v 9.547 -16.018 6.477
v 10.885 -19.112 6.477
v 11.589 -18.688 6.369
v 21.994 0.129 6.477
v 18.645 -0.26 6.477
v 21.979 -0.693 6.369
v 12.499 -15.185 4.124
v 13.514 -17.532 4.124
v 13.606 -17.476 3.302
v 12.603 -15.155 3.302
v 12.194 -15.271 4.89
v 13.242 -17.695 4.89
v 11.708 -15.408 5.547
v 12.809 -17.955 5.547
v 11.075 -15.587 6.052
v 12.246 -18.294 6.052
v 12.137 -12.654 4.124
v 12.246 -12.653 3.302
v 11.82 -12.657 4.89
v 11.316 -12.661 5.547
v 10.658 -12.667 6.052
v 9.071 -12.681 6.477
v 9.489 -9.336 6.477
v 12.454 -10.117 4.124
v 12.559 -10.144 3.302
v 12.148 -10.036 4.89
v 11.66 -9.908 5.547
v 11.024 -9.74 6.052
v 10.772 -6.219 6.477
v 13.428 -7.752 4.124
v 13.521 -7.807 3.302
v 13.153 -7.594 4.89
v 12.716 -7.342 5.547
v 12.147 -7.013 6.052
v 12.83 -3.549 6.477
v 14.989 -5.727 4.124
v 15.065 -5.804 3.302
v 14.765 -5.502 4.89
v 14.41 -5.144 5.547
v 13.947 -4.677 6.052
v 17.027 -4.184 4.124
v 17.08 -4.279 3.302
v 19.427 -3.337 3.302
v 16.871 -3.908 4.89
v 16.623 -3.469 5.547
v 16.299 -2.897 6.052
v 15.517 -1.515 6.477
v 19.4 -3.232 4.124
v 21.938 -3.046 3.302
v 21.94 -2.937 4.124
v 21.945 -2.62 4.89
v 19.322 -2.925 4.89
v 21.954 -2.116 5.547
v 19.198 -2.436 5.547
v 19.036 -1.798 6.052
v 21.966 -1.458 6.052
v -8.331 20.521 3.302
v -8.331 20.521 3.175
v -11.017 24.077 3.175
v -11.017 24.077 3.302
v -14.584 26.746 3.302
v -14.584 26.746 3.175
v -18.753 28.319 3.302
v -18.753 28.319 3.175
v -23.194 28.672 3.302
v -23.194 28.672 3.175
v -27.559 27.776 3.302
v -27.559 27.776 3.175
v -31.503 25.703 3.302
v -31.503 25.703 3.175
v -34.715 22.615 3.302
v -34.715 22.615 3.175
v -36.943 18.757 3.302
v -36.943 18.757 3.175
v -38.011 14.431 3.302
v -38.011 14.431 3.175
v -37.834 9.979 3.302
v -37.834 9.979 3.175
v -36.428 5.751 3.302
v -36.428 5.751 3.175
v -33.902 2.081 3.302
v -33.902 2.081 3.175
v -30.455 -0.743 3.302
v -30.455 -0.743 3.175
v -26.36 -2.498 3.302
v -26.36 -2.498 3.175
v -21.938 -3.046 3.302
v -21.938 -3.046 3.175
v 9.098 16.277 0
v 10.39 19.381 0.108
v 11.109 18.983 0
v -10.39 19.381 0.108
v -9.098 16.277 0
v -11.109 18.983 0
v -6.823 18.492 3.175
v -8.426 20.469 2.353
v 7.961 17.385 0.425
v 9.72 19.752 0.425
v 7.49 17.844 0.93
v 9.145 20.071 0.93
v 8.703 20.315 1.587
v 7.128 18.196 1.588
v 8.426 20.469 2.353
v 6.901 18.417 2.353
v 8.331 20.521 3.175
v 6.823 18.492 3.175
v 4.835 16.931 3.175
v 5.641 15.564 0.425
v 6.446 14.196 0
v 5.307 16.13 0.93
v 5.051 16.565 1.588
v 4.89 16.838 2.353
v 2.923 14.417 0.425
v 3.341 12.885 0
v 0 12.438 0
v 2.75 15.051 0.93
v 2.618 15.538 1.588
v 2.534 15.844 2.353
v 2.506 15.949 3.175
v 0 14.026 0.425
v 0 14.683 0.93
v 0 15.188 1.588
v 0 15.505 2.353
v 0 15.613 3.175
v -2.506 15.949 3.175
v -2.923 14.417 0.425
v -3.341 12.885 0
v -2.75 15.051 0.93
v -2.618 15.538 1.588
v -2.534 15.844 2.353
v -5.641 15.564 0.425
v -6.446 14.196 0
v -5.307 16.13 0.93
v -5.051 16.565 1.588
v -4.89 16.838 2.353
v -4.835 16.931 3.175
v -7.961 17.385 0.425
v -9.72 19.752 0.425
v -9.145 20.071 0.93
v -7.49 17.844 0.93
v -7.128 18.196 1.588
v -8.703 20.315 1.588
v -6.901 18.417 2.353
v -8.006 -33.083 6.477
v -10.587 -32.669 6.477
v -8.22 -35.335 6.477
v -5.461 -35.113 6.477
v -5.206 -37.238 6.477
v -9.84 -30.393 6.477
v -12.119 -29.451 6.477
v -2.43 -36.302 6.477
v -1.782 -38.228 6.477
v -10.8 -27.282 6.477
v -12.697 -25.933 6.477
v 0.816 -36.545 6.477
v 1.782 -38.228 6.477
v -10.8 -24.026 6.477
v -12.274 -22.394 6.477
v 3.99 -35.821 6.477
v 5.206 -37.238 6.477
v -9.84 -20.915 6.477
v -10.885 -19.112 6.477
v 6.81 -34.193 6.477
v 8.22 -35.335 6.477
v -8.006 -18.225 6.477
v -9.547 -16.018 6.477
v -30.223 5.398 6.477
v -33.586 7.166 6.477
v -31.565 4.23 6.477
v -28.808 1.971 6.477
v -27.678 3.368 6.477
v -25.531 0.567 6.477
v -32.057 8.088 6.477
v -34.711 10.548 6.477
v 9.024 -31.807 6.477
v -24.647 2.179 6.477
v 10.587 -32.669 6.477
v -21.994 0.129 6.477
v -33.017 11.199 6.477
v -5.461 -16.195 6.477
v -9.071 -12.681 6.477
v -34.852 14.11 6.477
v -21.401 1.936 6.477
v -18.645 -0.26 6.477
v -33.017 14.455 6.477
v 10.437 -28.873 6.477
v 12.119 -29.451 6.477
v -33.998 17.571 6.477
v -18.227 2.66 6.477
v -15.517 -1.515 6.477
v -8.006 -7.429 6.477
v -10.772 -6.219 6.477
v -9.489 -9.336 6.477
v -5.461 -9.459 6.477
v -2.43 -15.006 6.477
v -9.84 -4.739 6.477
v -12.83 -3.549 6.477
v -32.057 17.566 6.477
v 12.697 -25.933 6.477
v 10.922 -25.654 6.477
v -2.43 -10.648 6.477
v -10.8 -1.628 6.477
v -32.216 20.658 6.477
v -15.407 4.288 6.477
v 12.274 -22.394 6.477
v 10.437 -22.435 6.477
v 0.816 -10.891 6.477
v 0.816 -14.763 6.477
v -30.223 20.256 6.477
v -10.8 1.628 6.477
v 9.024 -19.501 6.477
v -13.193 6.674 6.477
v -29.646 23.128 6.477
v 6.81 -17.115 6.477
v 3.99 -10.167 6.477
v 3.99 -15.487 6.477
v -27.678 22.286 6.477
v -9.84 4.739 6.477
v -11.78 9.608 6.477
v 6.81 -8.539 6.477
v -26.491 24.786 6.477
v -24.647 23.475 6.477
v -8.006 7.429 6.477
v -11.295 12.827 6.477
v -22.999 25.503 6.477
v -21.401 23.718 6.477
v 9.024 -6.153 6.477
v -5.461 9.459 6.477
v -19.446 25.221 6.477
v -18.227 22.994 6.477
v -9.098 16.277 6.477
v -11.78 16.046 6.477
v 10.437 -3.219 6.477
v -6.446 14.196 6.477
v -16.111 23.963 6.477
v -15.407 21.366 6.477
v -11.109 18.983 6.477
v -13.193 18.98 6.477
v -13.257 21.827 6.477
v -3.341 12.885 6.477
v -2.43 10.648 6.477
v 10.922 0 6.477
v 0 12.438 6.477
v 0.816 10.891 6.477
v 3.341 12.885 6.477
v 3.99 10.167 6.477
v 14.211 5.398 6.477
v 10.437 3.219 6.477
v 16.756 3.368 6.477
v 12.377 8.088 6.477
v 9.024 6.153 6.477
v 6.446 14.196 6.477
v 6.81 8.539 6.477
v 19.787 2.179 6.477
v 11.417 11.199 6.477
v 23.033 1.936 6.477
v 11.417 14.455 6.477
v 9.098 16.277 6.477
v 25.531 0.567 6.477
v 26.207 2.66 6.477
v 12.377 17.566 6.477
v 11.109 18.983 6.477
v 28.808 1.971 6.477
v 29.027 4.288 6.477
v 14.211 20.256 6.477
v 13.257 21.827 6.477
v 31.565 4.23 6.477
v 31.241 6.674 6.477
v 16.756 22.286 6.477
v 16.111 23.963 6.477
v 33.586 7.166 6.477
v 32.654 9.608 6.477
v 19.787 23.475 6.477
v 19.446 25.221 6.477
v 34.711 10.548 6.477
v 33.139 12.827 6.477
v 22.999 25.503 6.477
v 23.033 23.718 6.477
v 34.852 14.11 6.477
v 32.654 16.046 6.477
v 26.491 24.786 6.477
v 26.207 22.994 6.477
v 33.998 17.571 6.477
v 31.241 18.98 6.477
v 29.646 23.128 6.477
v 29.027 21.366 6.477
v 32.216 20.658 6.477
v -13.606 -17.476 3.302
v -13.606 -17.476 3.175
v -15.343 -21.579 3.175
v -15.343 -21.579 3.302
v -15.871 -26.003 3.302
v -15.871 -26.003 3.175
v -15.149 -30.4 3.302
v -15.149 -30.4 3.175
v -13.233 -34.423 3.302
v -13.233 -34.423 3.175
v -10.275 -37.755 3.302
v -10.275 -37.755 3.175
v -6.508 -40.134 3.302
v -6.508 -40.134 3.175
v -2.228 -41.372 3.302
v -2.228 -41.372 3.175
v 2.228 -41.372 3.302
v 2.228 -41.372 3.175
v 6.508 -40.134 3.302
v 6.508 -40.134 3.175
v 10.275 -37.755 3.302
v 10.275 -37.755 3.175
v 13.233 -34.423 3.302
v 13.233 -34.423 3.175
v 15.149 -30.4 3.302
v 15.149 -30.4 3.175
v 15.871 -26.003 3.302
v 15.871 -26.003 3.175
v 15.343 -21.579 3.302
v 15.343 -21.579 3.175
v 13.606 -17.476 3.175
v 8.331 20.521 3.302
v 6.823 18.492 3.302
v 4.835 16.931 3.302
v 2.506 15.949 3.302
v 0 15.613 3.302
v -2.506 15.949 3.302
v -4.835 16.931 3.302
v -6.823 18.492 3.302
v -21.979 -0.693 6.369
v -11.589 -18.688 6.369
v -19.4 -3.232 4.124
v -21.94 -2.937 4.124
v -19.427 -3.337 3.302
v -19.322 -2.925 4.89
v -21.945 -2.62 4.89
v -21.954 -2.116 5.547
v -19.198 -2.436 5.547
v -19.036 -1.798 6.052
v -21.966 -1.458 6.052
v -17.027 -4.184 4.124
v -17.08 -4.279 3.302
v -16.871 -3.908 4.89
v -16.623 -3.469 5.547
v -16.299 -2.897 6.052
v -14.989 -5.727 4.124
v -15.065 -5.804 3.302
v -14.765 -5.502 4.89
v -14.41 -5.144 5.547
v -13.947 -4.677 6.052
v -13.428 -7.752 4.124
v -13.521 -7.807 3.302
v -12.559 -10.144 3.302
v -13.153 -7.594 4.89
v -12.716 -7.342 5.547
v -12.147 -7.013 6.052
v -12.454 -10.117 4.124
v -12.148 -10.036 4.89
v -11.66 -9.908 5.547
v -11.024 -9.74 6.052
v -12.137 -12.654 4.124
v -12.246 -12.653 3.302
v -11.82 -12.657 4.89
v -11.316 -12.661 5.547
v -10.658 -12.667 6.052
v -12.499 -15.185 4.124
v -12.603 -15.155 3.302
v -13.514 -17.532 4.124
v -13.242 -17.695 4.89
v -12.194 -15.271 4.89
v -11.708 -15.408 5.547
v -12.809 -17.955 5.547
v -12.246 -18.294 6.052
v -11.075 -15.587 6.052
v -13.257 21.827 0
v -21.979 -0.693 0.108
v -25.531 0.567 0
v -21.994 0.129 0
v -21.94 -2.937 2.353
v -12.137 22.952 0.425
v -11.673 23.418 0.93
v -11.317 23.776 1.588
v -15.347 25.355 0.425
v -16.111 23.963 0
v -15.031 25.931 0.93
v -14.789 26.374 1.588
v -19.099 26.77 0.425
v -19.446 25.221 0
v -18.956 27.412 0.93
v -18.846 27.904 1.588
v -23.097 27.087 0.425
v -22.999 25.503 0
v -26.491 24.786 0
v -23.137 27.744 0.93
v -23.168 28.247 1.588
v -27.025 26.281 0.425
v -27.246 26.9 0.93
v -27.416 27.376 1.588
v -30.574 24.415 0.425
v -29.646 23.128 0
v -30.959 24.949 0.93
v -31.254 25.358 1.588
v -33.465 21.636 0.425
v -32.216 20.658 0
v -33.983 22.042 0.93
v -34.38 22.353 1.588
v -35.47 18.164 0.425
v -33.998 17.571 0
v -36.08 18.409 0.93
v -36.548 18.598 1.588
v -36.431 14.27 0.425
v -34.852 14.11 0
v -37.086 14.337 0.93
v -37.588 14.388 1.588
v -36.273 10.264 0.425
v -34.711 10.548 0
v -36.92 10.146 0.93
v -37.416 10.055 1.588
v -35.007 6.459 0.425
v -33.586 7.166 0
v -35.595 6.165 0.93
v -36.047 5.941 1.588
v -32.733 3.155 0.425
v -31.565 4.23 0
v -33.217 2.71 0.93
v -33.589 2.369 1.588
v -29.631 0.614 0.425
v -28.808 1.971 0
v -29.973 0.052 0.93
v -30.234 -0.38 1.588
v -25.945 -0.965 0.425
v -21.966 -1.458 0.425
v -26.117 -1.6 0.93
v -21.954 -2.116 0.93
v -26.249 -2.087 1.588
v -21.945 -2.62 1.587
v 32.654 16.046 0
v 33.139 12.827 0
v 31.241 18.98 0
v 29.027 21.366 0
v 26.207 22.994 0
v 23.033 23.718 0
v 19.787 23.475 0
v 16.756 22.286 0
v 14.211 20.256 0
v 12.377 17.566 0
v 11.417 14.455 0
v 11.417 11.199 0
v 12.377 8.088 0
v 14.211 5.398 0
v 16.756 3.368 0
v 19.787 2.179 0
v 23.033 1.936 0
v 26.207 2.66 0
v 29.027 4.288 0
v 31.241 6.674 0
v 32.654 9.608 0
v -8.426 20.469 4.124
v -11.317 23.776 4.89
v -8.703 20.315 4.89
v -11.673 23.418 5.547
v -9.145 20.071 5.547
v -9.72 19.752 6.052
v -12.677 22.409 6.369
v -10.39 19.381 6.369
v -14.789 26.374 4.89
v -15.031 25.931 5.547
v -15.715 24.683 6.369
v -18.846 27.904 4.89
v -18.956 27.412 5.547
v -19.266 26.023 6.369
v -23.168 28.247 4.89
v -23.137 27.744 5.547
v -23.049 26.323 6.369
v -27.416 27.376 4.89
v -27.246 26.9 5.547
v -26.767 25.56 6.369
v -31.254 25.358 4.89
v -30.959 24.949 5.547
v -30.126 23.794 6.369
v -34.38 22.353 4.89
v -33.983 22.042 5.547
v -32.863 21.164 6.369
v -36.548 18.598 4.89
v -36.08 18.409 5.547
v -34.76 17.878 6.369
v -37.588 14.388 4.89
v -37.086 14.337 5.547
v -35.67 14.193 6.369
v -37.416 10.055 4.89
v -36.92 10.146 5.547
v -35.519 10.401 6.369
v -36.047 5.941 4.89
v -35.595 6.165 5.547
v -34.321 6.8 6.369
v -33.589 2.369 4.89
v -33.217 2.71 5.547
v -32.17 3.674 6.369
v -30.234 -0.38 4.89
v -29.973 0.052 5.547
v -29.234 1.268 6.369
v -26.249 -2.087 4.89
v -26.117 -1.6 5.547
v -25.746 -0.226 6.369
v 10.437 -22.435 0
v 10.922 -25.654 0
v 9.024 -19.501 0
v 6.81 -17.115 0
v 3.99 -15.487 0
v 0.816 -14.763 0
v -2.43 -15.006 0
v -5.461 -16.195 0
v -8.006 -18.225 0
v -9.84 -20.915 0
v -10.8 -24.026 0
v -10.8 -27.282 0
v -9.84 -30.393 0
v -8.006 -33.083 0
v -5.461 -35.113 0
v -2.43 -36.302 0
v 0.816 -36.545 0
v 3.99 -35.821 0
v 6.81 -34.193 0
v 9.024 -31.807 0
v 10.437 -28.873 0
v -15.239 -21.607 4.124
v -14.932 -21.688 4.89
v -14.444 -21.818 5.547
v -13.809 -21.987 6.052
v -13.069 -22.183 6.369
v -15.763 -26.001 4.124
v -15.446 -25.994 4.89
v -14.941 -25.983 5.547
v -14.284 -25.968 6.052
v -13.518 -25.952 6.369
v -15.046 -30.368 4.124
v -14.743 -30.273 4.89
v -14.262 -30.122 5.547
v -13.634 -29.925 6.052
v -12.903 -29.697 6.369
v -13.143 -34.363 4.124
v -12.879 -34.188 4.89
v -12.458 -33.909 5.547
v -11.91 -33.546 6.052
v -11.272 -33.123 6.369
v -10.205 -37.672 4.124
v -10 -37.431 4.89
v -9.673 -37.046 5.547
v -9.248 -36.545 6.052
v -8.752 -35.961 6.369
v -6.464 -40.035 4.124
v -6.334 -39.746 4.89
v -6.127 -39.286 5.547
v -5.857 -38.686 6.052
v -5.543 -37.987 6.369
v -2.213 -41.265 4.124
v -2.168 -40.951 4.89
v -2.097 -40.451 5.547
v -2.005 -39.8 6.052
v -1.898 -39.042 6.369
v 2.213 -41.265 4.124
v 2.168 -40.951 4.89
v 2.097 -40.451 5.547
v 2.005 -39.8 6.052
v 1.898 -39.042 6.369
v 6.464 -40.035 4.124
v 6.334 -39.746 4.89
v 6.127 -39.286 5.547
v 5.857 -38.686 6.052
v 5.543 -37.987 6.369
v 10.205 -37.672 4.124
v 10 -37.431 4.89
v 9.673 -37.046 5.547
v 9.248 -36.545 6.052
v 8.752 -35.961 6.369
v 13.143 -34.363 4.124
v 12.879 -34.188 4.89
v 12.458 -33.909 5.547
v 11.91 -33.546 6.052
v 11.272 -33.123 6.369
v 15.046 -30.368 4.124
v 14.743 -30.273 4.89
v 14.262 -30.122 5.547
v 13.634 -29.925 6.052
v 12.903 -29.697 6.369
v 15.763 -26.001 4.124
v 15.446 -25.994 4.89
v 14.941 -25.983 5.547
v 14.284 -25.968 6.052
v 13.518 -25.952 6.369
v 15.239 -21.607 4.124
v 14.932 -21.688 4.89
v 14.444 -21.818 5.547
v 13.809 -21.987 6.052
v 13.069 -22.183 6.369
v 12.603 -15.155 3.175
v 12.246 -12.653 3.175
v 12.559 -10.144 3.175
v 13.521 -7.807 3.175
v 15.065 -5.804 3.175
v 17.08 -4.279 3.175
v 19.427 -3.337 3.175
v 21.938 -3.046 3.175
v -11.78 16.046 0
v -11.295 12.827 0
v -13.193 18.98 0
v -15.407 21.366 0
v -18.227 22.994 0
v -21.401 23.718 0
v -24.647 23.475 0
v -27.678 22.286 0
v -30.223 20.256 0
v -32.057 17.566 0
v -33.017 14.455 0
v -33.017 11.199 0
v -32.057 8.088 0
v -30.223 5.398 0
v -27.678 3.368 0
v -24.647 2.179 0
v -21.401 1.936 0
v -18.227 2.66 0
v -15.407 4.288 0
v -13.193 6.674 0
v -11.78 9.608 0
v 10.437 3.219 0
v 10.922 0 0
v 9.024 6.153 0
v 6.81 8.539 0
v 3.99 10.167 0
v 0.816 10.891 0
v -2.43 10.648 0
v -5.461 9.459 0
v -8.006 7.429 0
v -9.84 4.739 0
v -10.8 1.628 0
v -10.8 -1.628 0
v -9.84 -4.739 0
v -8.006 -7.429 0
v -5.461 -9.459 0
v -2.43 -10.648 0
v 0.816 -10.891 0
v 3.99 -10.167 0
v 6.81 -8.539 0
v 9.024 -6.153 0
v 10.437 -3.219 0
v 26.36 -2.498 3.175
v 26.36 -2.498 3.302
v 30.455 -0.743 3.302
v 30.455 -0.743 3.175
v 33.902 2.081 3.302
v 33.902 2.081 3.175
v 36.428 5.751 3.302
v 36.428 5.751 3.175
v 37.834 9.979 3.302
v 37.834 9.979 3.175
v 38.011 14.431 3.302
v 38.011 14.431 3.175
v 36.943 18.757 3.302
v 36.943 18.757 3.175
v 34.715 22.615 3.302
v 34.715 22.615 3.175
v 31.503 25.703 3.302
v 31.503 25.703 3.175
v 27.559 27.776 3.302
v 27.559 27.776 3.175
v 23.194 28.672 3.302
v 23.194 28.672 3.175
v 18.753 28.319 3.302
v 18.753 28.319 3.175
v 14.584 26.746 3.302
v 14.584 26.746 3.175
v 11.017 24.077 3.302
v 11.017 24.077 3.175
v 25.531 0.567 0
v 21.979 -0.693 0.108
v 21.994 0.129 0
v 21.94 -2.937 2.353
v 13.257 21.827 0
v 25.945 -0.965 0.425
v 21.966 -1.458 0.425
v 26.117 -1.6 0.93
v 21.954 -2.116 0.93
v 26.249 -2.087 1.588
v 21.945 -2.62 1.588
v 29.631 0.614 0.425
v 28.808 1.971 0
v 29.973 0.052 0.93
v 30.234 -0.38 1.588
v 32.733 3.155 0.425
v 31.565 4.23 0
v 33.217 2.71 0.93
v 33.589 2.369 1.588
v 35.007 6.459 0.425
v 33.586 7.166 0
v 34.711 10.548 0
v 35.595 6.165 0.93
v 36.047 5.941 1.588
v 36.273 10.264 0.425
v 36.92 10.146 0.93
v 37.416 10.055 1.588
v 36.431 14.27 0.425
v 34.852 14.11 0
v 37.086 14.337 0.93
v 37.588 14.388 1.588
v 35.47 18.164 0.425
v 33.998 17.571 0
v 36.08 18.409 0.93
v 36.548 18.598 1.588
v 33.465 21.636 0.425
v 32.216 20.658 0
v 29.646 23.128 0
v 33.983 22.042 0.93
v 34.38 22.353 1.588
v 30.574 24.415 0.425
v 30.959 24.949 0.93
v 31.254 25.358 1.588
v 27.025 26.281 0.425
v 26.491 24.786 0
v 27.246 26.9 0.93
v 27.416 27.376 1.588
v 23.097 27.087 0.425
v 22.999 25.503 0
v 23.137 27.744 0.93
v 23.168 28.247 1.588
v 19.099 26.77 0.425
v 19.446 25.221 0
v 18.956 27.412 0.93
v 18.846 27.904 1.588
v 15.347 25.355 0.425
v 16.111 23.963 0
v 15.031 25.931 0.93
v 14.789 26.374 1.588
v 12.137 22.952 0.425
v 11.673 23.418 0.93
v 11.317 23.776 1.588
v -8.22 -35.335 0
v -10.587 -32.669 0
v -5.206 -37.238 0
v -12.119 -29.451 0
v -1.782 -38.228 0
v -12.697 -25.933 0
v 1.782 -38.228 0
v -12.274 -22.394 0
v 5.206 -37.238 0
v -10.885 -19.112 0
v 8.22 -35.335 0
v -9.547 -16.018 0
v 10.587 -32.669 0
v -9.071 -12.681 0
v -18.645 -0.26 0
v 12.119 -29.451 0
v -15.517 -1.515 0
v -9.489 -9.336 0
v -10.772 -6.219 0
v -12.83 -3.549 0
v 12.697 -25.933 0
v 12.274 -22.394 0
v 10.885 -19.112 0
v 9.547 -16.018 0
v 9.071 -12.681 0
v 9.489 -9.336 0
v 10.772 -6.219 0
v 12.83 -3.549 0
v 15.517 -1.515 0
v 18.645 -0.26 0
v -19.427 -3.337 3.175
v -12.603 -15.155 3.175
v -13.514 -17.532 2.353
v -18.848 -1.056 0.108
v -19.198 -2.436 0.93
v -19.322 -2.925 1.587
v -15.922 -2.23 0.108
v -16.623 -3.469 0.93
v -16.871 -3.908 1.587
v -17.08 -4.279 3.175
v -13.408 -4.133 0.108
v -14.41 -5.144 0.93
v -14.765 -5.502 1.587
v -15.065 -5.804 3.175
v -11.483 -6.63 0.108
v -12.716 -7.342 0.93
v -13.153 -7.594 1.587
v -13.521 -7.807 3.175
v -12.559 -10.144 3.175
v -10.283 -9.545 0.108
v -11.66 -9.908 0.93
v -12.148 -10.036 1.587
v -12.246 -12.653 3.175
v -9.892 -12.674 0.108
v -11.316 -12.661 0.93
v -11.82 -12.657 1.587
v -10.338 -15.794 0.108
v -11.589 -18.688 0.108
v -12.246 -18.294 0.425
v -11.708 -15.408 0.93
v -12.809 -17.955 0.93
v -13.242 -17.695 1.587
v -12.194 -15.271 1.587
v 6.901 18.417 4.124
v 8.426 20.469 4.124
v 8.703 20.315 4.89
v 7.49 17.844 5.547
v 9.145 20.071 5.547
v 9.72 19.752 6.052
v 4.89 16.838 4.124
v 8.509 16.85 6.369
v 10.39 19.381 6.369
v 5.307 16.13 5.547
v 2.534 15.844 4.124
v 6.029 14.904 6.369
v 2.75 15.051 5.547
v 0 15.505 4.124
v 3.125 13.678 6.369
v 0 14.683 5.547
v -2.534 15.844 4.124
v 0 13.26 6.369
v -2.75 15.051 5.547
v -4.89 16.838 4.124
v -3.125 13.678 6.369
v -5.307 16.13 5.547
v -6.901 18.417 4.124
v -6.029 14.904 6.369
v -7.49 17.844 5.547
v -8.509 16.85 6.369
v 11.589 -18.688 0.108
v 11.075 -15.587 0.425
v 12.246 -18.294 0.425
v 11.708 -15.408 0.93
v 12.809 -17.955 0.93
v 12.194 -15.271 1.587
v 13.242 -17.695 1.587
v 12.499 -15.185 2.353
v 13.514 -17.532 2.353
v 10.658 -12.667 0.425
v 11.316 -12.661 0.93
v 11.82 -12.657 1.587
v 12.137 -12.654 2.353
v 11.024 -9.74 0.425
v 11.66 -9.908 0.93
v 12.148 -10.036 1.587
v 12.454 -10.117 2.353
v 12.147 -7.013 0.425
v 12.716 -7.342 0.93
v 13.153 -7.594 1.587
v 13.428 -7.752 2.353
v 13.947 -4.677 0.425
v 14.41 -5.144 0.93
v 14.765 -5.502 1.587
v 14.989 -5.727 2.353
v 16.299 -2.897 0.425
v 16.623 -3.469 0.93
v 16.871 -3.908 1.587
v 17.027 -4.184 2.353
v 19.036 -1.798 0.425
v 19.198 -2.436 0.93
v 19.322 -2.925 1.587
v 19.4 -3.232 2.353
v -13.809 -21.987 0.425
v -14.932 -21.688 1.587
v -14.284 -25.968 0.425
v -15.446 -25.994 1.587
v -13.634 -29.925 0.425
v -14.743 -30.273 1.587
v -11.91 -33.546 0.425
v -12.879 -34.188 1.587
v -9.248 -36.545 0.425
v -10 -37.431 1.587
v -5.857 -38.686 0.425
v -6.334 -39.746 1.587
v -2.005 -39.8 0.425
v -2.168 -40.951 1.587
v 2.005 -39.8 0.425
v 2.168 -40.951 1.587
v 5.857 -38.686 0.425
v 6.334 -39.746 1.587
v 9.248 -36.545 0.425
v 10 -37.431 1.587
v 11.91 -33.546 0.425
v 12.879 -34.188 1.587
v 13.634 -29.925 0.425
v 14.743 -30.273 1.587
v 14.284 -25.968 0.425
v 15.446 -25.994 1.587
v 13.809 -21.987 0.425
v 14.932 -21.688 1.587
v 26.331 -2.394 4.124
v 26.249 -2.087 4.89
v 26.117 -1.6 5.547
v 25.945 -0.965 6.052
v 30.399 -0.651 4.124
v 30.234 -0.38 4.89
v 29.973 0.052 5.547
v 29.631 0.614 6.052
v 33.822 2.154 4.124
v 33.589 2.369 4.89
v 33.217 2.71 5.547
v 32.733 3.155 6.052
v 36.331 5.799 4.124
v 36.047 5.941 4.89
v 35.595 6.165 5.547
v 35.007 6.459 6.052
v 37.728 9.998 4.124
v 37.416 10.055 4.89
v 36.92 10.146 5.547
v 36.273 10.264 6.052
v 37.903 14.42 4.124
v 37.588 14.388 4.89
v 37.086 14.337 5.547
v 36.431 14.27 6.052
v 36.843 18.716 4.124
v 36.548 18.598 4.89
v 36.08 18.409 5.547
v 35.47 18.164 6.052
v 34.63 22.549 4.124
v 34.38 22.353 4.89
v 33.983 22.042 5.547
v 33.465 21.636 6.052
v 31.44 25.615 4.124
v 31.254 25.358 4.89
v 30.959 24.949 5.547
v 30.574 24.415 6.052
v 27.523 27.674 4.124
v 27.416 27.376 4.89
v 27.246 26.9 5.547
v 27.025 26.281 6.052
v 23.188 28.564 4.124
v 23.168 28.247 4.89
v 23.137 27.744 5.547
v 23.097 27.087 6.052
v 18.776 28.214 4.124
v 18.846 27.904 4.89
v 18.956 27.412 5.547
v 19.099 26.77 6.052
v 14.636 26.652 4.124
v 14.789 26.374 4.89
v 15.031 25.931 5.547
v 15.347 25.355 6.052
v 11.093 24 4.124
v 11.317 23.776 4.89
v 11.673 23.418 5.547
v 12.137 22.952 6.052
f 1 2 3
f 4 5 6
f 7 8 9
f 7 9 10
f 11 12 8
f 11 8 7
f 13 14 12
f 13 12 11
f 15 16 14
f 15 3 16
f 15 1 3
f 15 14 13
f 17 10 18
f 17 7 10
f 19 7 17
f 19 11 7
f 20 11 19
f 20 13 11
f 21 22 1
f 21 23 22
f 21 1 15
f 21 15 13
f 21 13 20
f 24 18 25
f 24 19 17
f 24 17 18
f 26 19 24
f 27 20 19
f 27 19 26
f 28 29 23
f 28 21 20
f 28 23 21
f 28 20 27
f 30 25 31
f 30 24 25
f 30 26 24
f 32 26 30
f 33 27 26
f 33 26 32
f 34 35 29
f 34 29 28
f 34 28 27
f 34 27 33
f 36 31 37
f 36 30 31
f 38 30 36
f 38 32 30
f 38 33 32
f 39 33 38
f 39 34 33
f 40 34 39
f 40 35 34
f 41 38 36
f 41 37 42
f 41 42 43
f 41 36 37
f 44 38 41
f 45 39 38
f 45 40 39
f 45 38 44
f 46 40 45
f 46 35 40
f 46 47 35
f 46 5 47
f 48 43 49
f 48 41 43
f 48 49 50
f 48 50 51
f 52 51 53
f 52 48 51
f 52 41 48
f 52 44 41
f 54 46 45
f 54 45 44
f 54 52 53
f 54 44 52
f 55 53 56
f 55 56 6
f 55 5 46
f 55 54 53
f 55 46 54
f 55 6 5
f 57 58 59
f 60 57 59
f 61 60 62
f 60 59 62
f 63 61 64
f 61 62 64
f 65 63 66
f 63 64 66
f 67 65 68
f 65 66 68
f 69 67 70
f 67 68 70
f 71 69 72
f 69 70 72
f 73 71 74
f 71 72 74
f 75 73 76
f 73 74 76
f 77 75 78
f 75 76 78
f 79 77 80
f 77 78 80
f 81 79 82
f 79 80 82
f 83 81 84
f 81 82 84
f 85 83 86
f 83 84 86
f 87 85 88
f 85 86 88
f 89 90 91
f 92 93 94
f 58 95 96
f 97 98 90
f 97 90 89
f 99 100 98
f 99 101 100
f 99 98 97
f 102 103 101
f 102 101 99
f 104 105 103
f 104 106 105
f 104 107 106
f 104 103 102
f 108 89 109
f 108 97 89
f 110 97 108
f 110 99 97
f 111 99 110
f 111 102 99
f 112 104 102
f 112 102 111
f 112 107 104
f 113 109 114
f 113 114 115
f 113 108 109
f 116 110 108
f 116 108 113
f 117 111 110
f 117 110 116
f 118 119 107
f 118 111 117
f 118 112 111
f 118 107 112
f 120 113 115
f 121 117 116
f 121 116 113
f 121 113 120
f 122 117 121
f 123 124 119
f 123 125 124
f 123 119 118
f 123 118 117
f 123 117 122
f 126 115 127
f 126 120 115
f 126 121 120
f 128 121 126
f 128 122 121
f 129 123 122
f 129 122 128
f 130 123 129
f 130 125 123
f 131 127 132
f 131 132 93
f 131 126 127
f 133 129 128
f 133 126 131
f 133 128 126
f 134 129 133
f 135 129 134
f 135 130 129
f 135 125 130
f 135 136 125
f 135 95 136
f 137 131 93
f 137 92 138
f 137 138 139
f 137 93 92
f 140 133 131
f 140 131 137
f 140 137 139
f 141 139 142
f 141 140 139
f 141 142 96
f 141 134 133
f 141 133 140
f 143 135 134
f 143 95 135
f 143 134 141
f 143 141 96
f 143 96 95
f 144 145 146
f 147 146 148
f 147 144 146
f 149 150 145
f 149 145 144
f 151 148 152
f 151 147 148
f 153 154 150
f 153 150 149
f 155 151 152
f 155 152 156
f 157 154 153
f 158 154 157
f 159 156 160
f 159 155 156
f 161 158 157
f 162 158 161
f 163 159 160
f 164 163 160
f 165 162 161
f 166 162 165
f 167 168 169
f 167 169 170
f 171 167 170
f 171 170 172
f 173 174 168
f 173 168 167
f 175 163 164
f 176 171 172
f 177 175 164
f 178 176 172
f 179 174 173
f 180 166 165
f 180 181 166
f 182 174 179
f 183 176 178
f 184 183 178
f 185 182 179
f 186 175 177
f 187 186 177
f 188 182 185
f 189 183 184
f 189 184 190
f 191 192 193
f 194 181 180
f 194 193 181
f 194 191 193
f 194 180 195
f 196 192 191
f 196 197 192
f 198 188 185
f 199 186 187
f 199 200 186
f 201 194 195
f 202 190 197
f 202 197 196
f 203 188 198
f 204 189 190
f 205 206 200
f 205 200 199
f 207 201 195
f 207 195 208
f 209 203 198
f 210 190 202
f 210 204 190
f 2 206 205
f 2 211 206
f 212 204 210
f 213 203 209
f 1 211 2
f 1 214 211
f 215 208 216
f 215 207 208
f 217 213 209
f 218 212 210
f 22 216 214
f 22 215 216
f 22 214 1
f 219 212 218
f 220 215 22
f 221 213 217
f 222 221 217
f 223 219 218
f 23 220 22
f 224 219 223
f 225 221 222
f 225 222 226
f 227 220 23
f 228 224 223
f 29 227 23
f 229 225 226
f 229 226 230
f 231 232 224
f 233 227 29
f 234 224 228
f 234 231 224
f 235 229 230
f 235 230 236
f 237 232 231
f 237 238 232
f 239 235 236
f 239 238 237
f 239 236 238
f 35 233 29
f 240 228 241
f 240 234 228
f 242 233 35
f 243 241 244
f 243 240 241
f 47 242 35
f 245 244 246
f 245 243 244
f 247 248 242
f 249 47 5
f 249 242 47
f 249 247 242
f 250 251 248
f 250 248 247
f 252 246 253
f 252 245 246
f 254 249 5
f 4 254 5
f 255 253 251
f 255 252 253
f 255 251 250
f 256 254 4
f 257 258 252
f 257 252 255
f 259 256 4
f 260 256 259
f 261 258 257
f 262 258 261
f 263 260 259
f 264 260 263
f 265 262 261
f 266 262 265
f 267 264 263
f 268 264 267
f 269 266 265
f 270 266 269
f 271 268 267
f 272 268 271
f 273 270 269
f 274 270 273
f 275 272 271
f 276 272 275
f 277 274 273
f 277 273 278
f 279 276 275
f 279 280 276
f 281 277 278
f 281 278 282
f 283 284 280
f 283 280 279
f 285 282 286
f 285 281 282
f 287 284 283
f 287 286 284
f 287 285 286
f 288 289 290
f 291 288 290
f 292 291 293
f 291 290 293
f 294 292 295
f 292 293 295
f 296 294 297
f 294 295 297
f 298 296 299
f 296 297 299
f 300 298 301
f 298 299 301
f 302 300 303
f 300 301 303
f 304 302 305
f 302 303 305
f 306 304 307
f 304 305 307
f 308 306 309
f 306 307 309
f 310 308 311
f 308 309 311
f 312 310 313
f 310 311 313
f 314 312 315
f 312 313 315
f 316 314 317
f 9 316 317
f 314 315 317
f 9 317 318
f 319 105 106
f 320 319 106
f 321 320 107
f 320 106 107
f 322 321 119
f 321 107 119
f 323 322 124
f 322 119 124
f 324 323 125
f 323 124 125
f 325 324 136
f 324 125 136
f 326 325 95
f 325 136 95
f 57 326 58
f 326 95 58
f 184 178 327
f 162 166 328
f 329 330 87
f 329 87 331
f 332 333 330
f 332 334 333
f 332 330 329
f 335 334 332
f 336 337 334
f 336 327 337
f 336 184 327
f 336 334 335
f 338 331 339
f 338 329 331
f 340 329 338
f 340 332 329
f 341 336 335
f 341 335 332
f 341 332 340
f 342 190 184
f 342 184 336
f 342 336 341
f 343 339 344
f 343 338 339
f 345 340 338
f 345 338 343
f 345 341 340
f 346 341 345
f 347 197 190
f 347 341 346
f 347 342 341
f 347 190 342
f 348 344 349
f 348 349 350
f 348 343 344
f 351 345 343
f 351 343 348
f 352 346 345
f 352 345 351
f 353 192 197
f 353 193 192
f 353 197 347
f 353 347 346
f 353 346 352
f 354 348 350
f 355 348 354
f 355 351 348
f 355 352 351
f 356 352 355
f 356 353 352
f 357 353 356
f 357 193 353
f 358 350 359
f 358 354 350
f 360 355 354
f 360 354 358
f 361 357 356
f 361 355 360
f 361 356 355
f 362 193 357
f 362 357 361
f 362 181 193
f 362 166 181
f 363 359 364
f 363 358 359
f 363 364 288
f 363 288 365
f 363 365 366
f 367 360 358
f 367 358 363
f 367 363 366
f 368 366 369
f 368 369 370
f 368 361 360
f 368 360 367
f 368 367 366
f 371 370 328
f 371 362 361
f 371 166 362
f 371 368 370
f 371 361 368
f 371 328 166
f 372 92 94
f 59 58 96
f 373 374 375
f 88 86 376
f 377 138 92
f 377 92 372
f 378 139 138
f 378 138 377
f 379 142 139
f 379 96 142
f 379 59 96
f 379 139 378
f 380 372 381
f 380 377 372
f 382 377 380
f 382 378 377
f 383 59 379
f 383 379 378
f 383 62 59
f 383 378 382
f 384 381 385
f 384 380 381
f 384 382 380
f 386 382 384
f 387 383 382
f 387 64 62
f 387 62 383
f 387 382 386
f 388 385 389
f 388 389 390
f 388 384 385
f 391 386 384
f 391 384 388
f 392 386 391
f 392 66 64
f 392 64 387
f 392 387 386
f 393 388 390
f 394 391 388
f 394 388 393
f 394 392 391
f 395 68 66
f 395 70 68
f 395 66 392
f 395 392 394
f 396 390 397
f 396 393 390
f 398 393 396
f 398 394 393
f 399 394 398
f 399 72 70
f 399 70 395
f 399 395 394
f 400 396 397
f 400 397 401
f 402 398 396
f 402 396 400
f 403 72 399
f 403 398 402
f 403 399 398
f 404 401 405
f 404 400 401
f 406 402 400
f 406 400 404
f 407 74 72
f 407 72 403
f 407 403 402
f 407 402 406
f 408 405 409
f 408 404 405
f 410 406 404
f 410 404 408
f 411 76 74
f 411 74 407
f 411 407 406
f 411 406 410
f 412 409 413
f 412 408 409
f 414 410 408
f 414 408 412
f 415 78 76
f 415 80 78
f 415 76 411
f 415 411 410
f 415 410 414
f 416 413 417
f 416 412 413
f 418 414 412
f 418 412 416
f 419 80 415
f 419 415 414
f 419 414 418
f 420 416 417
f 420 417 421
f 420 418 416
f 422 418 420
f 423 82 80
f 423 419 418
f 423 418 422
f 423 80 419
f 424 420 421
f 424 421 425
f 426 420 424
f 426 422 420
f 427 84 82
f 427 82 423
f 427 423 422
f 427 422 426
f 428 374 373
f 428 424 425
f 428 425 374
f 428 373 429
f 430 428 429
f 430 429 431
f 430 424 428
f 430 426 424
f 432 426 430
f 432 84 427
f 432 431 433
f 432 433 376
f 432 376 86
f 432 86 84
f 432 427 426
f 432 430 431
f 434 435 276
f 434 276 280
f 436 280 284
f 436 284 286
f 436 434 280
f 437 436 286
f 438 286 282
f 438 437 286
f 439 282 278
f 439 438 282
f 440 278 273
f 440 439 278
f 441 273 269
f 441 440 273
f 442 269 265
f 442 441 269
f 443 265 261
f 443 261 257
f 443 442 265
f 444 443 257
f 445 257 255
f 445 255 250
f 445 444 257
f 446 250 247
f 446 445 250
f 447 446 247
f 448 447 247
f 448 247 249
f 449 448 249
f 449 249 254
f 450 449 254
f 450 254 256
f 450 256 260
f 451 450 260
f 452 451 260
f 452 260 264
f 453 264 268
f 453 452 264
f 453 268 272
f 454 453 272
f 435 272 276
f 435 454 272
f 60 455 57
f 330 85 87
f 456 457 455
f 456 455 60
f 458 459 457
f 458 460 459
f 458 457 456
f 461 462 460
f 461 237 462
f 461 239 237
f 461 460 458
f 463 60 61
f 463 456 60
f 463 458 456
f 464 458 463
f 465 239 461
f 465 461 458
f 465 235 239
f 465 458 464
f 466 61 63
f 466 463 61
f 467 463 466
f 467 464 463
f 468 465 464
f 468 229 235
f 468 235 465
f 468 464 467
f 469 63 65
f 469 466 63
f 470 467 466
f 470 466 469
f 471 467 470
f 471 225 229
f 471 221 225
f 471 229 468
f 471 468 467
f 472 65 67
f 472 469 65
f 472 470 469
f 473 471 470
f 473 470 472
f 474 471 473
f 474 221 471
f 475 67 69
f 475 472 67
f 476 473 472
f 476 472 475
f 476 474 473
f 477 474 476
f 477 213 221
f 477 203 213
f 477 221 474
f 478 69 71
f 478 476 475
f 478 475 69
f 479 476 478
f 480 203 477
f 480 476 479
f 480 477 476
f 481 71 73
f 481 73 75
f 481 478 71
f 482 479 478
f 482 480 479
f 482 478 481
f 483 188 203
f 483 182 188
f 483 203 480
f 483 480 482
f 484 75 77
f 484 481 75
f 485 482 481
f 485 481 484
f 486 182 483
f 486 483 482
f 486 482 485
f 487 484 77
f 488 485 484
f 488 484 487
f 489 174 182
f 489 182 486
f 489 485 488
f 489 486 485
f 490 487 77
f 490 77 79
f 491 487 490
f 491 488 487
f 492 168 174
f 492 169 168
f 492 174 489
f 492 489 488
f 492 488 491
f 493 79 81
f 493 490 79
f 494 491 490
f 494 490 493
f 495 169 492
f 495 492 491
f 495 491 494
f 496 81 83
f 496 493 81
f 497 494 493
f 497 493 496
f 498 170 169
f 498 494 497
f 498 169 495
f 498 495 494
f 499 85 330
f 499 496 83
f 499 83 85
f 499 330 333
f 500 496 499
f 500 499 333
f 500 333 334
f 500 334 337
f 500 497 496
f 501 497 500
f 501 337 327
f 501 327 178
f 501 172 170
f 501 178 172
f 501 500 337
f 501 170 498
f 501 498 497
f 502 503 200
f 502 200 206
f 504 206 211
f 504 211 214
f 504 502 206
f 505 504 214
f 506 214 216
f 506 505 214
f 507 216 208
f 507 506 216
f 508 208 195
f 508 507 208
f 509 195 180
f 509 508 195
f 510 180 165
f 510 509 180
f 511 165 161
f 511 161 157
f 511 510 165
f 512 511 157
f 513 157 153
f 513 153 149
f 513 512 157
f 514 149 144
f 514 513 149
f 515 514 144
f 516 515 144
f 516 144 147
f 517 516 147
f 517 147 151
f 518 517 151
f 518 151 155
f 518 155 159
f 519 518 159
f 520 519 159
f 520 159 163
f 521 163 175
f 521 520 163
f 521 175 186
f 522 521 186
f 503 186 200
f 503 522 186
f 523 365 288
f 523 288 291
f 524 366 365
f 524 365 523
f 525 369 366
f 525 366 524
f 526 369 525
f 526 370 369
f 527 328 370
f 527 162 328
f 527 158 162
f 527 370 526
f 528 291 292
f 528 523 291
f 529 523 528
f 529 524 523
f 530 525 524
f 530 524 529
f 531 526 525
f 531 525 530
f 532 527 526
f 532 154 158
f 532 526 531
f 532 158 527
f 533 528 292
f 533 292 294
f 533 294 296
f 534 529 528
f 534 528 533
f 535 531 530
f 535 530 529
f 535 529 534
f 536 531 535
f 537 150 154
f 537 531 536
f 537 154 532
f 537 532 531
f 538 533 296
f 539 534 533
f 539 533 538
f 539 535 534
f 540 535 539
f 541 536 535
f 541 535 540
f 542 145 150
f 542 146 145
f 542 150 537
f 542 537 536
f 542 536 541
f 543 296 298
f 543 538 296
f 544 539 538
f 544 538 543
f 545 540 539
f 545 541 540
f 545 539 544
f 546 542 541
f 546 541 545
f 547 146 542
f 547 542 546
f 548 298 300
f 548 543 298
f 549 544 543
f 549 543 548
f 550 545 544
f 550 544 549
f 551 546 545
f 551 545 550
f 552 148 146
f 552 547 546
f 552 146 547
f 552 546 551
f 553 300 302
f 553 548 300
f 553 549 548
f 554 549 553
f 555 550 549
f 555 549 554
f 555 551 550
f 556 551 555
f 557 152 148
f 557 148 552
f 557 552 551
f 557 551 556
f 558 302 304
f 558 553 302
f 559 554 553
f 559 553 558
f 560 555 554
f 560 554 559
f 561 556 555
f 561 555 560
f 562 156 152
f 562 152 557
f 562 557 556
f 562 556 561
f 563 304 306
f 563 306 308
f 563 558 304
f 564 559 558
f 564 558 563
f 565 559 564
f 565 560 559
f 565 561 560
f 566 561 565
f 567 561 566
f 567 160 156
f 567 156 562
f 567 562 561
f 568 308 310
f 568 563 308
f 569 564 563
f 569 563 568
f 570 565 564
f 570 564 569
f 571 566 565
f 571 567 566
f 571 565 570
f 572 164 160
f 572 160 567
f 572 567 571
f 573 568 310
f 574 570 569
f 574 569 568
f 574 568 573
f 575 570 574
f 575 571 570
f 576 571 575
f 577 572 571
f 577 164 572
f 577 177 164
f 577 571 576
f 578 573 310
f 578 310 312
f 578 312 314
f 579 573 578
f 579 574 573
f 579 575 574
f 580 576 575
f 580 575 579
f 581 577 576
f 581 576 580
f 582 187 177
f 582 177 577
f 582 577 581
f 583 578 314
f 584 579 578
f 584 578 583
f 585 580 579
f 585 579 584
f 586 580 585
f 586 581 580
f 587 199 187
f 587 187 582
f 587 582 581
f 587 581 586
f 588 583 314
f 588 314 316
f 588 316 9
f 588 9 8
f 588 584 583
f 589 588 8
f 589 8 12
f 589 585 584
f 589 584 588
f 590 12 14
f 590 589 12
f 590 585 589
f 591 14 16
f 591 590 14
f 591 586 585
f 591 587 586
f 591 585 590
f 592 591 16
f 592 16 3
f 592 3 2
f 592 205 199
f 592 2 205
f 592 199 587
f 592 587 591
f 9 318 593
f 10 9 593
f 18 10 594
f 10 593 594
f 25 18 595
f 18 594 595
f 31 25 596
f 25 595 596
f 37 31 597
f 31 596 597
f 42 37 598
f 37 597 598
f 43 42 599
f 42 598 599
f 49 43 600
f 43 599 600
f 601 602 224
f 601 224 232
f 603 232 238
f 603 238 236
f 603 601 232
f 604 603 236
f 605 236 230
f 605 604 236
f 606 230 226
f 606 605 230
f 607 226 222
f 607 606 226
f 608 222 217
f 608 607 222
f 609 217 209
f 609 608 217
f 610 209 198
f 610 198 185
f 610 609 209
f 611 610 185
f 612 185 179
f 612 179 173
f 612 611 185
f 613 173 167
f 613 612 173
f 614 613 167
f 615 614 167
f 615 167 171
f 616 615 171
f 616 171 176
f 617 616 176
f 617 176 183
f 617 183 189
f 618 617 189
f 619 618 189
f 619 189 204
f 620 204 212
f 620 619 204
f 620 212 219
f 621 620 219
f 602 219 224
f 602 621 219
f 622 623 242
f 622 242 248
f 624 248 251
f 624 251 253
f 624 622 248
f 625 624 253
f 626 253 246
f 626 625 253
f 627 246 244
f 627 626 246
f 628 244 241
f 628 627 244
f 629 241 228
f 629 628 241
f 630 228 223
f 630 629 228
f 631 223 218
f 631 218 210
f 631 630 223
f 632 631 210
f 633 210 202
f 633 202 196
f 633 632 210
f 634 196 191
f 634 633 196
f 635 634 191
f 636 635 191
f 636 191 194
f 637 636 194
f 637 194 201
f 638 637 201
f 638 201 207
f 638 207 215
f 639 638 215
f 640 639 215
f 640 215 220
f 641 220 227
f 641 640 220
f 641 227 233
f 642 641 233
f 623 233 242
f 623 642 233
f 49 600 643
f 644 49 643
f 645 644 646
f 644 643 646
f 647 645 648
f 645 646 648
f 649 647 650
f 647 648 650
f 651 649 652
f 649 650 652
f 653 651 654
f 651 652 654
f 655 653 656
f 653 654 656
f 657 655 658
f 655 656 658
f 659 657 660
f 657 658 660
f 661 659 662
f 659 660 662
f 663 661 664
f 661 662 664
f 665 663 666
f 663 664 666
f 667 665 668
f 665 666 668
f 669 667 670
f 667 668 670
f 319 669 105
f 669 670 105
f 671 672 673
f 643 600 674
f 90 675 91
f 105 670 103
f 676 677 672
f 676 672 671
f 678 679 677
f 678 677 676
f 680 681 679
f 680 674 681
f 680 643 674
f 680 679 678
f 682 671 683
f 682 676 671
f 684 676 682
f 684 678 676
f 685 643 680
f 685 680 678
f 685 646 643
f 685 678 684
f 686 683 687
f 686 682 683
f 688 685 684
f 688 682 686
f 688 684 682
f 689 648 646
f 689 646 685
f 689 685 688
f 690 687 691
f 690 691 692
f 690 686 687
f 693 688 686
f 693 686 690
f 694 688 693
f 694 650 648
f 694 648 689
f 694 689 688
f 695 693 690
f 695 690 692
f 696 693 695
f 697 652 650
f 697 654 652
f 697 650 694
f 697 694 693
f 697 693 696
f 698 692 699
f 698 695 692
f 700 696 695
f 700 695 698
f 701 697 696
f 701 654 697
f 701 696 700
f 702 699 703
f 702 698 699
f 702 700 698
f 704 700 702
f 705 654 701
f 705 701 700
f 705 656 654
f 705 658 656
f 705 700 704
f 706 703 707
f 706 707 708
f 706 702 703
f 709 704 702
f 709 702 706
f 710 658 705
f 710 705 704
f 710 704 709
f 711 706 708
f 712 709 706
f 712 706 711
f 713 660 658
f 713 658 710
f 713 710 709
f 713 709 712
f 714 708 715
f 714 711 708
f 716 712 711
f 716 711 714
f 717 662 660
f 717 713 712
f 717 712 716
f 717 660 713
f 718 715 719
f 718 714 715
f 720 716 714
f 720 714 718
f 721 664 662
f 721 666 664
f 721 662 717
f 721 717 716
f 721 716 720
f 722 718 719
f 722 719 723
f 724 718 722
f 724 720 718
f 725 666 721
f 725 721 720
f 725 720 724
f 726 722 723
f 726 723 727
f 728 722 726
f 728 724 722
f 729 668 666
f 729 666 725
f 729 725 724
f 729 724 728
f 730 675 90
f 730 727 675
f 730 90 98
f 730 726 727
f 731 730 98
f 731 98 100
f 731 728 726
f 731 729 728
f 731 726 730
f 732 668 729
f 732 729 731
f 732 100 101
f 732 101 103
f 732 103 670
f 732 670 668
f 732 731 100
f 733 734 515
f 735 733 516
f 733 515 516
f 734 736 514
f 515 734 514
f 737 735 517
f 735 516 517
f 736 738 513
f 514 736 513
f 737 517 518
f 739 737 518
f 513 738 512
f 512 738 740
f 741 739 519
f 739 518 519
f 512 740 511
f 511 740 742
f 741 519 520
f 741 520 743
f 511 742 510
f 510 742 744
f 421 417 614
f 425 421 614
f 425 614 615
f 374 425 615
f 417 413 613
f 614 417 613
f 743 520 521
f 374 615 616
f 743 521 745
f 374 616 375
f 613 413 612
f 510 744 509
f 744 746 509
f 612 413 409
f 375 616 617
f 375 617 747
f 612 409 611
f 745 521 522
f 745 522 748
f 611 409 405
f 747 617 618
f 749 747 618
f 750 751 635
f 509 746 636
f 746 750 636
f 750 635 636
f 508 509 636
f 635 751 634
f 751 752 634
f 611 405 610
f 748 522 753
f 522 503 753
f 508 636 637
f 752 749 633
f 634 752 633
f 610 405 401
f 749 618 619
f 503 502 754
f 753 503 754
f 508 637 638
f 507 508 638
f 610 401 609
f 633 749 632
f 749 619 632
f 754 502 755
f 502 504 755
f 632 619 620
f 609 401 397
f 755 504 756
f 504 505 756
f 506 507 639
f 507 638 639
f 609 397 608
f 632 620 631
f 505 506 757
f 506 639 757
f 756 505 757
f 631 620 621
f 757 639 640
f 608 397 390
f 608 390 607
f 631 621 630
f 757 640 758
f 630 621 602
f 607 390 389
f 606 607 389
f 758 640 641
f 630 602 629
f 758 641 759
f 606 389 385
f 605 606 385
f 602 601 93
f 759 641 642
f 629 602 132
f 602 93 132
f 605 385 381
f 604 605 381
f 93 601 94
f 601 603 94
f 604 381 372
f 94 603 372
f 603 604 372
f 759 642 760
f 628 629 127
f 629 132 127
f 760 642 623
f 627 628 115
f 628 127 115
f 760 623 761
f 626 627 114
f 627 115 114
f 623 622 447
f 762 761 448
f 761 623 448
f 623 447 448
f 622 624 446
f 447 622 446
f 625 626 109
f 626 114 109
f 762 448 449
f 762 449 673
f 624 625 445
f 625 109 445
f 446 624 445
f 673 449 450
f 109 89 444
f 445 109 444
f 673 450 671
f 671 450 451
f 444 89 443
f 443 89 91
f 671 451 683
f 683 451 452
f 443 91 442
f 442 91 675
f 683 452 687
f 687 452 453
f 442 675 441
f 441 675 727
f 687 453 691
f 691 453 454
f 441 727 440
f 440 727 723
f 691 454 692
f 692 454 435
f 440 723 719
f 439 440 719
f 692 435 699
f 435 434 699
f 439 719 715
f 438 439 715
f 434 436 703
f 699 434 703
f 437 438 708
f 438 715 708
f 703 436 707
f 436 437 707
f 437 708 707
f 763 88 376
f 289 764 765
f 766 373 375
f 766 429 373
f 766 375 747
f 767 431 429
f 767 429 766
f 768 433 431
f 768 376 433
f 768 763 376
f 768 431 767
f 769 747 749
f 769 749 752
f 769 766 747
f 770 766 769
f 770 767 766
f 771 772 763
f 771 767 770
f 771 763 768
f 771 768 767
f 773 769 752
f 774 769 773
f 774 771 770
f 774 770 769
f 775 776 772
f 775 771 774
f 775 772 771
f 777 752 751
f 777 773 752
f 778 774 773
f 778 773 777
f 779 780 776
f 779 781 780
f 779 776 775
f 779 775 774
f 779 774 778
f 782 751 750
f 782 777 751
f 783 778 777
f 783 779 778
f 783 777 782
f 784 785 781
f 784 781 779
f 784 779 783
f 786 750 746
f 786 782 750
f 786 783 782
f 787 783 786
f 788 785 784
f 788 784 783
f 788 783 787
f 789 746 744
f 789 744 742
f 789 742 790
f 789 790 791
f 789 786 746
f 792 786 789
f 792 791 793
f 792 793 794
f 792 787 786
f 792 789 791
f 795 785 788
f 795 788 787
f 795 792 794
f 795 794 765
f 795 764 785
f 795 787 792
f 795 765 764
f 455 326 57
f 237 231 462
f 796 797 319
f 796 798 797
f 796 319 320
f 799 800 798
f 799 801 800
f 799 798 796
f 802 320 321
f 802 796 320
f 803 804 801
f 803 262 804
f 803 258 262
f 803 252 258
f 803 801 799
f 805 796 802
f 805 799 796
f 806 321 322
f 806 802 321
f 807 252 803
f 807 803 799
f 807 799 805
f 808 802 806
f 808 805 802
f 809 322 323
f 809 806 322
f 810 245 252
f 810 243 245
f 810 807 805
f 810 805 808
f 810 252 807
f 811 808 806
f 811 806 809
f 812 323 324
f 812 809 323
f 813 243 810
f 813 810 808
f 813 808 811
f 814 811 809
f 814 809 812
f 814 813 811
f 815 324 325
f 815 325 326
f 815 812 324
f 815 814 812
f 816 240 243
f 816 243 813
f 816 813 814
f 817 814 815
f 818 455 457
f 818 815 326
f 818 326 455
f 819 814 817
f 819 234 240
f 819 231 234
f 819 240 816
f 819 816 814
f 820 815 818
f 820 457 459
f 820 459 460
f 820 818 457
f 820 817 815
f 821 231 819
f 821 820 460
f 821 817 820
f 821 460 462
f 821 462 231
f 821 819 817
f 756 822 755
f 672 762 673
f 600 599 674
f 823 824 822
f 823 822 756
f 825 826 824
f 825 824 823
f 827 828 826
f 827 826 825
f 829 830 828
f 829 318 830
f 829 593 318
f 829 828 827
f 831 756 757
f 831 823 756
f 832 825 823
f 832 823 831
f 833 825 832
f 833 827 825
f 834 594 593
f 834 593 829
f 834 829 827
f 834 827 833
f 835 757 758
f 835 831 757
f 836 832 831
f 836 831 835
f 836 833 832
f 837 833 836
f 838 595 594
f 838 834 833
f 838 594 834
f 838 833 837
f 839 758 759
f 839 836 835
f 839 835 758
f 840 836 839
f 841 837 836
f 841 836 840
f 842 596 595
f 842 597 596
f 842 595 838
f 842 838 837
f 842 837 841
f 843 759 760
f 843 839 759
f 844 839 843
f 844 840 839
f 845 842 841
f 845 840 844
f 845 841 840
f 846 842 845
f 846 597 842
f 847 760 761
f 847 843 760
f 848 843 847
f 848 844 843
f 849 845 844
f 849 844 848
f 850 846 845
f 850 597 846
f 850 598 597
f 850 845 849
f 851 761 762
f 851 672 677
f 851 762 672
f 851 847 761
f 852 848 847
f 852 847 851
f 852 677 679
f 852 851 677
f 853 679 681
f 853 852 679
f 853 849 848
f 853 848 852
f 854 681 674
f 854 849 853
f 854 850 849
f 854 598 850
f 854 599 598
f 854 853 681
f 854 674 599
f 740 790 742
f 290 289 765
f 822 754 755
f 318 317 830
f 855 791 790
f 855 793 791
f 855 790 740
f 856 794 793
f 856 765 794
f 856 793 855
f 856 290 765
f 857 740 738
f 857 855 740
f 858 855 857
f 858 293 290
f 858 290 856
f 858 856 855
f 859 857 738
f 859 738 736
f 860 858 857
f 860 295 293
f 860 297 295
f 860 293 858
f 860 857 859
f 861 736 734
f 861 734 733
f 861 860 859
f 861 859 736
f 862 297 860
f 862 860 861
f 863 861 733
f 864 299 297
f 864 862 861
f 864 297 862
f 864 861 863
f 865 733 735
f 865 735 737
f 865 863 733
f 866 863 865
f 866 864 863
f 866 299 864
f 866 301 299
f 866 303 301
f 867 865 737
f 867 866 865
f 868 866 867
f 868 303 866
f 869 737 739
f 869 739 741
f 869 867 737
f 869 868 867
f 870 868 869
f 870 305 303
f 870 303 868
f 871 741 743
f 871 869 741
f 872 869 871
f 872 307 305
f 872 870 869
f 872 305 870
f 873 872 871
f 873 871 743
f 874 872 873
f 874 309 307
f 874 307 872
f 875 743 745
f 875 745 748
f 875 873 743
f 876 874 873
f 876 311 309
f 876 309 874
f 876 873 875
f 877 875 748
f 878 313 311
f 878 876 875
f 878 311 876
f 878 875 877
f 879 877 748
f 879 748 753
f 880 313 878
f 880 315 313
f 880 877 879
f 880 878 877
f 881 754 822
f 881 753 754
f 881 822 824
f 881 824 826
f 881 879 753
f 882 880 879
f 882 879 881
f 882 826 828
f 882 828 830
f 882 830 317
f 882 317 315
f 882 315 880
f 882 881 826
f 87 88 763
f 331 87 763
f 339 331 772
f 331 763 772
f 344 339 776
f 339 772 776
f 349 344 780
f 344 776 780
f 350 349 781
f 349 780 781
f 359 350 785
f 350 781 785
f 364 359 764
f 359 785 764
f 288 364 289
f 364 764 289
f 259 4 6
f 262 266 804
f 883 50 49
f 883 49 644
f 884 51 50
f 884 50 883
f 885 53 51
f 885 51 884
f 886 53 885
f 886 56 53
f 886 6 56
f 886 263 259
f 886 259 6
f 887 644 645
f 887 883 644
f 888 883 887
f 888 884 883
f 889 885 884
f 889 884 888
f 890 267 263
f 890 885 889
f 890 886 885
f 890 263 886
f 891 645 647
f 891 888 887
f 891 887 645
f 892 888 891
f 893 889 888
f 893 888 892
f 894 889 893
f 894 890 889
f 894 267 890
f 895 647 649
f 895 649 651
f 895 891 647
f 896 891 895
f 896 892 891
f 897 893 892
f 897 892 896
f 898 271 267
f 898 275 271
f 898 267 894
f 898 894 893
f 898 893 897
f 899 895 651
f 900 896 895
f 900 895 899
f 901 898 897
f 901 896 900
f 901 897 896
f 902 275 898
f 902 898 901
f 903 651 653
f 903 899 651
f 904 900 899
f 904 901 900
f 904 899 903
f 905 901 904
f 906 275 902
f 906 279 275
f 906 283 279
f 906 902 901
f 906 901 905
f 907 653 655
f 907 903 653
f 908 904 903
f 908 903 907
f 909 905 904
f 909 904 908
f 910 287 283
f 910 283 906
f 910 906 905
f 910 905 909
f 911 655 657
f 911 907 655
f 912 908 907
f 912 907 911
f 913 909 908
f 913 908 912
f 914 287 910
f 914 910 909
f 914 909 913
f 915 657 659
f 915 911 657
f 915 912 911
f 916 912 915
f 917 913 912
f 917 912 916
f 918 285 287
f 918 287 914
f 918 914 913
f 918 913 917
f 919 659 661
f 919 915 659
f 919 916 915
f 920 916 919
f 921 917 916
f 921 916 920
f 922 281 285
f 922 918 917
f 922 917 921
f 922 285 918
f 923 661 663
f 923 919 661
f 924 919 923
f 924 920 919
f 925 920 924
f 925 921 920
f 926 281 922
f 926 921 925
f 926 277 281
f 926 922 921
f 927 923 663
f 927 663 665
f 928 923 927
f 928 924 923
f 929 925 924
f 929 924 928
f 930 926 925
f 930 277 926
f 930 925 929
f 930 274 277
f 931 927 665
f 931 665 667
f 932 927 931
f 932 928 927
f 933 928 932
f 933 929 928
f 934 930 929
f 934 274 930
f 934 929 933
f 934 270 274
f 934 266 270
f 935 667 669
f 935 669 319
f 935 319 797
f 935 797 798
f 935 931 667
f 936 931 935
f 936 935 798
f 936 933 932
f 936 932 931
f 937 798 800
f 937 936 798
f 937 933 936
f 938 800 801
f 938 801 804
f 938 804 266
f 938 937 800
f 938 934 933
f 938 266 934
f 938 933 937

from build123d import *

# Parameters (mm, degrees)
F0_R     = 10.922
F1_DEPTH = 6.477
F2_R     = 3.175
F3_R     = 3.175


with BuildPart() as f1:
    # F0 (on Top) → F1 (new body)
    with BuildSketch(Plane.XY):
        with BuildLine():
            ThreePointArc((8.331381, 20.521464), (0, 15.613142), (-8.331381, 20.521464))
            ThreePointArc((-8.331381, 20.521464), (-35.965169, 20.7645), (-21.937799, -3.045544))
            ThreePointArc((-21.937799, -3.045544), (-13.521377, -7.806571), (-13.606418, -17.475919))
            ThreePointArc((-13.606418, -17.475919), (0, -41.529), (13.606418, -17.475919))
            ThreePointArc((13.606418, -17.475919), (13.521377, -7.806571), (21.937799, -3.045544))
            ThreePointArc((21.937799, -3.045544), (35.965169, 20.7645), (8.331381, 20.521464))
        make_face()
        with Locations((0, -25.654)):
            Circle(F0_R, mode=Mode.SUBTRACT)
        with Locations((-22.217016, 12.827)):
            Circle(F0_R, mode=Mode.SUBTRACT)
        Circle(F0_R, mode=Mode.SUBTRACT)
        with Locations((22.217016, 12.827)):
            Circle(F0_R, mode=Mode.SUBTRACT)
    extrude(amount=F1_DEPTH)

    # F2
    f2_edges = [f1.edges().sort_by_distance(p)[0] for p in [
        (-35.965169, 20.7645, 6.477),
    ]]
    fillet(f2_edges, radius=F2_R)

    # F3
    f3_edges = [f1.edges().sort_by_distance(p)[0] for p in [
        (0, -41.529, 0),
    ]]
    fillet(f3_edges, radius=F3_R)


solid = f1.part
